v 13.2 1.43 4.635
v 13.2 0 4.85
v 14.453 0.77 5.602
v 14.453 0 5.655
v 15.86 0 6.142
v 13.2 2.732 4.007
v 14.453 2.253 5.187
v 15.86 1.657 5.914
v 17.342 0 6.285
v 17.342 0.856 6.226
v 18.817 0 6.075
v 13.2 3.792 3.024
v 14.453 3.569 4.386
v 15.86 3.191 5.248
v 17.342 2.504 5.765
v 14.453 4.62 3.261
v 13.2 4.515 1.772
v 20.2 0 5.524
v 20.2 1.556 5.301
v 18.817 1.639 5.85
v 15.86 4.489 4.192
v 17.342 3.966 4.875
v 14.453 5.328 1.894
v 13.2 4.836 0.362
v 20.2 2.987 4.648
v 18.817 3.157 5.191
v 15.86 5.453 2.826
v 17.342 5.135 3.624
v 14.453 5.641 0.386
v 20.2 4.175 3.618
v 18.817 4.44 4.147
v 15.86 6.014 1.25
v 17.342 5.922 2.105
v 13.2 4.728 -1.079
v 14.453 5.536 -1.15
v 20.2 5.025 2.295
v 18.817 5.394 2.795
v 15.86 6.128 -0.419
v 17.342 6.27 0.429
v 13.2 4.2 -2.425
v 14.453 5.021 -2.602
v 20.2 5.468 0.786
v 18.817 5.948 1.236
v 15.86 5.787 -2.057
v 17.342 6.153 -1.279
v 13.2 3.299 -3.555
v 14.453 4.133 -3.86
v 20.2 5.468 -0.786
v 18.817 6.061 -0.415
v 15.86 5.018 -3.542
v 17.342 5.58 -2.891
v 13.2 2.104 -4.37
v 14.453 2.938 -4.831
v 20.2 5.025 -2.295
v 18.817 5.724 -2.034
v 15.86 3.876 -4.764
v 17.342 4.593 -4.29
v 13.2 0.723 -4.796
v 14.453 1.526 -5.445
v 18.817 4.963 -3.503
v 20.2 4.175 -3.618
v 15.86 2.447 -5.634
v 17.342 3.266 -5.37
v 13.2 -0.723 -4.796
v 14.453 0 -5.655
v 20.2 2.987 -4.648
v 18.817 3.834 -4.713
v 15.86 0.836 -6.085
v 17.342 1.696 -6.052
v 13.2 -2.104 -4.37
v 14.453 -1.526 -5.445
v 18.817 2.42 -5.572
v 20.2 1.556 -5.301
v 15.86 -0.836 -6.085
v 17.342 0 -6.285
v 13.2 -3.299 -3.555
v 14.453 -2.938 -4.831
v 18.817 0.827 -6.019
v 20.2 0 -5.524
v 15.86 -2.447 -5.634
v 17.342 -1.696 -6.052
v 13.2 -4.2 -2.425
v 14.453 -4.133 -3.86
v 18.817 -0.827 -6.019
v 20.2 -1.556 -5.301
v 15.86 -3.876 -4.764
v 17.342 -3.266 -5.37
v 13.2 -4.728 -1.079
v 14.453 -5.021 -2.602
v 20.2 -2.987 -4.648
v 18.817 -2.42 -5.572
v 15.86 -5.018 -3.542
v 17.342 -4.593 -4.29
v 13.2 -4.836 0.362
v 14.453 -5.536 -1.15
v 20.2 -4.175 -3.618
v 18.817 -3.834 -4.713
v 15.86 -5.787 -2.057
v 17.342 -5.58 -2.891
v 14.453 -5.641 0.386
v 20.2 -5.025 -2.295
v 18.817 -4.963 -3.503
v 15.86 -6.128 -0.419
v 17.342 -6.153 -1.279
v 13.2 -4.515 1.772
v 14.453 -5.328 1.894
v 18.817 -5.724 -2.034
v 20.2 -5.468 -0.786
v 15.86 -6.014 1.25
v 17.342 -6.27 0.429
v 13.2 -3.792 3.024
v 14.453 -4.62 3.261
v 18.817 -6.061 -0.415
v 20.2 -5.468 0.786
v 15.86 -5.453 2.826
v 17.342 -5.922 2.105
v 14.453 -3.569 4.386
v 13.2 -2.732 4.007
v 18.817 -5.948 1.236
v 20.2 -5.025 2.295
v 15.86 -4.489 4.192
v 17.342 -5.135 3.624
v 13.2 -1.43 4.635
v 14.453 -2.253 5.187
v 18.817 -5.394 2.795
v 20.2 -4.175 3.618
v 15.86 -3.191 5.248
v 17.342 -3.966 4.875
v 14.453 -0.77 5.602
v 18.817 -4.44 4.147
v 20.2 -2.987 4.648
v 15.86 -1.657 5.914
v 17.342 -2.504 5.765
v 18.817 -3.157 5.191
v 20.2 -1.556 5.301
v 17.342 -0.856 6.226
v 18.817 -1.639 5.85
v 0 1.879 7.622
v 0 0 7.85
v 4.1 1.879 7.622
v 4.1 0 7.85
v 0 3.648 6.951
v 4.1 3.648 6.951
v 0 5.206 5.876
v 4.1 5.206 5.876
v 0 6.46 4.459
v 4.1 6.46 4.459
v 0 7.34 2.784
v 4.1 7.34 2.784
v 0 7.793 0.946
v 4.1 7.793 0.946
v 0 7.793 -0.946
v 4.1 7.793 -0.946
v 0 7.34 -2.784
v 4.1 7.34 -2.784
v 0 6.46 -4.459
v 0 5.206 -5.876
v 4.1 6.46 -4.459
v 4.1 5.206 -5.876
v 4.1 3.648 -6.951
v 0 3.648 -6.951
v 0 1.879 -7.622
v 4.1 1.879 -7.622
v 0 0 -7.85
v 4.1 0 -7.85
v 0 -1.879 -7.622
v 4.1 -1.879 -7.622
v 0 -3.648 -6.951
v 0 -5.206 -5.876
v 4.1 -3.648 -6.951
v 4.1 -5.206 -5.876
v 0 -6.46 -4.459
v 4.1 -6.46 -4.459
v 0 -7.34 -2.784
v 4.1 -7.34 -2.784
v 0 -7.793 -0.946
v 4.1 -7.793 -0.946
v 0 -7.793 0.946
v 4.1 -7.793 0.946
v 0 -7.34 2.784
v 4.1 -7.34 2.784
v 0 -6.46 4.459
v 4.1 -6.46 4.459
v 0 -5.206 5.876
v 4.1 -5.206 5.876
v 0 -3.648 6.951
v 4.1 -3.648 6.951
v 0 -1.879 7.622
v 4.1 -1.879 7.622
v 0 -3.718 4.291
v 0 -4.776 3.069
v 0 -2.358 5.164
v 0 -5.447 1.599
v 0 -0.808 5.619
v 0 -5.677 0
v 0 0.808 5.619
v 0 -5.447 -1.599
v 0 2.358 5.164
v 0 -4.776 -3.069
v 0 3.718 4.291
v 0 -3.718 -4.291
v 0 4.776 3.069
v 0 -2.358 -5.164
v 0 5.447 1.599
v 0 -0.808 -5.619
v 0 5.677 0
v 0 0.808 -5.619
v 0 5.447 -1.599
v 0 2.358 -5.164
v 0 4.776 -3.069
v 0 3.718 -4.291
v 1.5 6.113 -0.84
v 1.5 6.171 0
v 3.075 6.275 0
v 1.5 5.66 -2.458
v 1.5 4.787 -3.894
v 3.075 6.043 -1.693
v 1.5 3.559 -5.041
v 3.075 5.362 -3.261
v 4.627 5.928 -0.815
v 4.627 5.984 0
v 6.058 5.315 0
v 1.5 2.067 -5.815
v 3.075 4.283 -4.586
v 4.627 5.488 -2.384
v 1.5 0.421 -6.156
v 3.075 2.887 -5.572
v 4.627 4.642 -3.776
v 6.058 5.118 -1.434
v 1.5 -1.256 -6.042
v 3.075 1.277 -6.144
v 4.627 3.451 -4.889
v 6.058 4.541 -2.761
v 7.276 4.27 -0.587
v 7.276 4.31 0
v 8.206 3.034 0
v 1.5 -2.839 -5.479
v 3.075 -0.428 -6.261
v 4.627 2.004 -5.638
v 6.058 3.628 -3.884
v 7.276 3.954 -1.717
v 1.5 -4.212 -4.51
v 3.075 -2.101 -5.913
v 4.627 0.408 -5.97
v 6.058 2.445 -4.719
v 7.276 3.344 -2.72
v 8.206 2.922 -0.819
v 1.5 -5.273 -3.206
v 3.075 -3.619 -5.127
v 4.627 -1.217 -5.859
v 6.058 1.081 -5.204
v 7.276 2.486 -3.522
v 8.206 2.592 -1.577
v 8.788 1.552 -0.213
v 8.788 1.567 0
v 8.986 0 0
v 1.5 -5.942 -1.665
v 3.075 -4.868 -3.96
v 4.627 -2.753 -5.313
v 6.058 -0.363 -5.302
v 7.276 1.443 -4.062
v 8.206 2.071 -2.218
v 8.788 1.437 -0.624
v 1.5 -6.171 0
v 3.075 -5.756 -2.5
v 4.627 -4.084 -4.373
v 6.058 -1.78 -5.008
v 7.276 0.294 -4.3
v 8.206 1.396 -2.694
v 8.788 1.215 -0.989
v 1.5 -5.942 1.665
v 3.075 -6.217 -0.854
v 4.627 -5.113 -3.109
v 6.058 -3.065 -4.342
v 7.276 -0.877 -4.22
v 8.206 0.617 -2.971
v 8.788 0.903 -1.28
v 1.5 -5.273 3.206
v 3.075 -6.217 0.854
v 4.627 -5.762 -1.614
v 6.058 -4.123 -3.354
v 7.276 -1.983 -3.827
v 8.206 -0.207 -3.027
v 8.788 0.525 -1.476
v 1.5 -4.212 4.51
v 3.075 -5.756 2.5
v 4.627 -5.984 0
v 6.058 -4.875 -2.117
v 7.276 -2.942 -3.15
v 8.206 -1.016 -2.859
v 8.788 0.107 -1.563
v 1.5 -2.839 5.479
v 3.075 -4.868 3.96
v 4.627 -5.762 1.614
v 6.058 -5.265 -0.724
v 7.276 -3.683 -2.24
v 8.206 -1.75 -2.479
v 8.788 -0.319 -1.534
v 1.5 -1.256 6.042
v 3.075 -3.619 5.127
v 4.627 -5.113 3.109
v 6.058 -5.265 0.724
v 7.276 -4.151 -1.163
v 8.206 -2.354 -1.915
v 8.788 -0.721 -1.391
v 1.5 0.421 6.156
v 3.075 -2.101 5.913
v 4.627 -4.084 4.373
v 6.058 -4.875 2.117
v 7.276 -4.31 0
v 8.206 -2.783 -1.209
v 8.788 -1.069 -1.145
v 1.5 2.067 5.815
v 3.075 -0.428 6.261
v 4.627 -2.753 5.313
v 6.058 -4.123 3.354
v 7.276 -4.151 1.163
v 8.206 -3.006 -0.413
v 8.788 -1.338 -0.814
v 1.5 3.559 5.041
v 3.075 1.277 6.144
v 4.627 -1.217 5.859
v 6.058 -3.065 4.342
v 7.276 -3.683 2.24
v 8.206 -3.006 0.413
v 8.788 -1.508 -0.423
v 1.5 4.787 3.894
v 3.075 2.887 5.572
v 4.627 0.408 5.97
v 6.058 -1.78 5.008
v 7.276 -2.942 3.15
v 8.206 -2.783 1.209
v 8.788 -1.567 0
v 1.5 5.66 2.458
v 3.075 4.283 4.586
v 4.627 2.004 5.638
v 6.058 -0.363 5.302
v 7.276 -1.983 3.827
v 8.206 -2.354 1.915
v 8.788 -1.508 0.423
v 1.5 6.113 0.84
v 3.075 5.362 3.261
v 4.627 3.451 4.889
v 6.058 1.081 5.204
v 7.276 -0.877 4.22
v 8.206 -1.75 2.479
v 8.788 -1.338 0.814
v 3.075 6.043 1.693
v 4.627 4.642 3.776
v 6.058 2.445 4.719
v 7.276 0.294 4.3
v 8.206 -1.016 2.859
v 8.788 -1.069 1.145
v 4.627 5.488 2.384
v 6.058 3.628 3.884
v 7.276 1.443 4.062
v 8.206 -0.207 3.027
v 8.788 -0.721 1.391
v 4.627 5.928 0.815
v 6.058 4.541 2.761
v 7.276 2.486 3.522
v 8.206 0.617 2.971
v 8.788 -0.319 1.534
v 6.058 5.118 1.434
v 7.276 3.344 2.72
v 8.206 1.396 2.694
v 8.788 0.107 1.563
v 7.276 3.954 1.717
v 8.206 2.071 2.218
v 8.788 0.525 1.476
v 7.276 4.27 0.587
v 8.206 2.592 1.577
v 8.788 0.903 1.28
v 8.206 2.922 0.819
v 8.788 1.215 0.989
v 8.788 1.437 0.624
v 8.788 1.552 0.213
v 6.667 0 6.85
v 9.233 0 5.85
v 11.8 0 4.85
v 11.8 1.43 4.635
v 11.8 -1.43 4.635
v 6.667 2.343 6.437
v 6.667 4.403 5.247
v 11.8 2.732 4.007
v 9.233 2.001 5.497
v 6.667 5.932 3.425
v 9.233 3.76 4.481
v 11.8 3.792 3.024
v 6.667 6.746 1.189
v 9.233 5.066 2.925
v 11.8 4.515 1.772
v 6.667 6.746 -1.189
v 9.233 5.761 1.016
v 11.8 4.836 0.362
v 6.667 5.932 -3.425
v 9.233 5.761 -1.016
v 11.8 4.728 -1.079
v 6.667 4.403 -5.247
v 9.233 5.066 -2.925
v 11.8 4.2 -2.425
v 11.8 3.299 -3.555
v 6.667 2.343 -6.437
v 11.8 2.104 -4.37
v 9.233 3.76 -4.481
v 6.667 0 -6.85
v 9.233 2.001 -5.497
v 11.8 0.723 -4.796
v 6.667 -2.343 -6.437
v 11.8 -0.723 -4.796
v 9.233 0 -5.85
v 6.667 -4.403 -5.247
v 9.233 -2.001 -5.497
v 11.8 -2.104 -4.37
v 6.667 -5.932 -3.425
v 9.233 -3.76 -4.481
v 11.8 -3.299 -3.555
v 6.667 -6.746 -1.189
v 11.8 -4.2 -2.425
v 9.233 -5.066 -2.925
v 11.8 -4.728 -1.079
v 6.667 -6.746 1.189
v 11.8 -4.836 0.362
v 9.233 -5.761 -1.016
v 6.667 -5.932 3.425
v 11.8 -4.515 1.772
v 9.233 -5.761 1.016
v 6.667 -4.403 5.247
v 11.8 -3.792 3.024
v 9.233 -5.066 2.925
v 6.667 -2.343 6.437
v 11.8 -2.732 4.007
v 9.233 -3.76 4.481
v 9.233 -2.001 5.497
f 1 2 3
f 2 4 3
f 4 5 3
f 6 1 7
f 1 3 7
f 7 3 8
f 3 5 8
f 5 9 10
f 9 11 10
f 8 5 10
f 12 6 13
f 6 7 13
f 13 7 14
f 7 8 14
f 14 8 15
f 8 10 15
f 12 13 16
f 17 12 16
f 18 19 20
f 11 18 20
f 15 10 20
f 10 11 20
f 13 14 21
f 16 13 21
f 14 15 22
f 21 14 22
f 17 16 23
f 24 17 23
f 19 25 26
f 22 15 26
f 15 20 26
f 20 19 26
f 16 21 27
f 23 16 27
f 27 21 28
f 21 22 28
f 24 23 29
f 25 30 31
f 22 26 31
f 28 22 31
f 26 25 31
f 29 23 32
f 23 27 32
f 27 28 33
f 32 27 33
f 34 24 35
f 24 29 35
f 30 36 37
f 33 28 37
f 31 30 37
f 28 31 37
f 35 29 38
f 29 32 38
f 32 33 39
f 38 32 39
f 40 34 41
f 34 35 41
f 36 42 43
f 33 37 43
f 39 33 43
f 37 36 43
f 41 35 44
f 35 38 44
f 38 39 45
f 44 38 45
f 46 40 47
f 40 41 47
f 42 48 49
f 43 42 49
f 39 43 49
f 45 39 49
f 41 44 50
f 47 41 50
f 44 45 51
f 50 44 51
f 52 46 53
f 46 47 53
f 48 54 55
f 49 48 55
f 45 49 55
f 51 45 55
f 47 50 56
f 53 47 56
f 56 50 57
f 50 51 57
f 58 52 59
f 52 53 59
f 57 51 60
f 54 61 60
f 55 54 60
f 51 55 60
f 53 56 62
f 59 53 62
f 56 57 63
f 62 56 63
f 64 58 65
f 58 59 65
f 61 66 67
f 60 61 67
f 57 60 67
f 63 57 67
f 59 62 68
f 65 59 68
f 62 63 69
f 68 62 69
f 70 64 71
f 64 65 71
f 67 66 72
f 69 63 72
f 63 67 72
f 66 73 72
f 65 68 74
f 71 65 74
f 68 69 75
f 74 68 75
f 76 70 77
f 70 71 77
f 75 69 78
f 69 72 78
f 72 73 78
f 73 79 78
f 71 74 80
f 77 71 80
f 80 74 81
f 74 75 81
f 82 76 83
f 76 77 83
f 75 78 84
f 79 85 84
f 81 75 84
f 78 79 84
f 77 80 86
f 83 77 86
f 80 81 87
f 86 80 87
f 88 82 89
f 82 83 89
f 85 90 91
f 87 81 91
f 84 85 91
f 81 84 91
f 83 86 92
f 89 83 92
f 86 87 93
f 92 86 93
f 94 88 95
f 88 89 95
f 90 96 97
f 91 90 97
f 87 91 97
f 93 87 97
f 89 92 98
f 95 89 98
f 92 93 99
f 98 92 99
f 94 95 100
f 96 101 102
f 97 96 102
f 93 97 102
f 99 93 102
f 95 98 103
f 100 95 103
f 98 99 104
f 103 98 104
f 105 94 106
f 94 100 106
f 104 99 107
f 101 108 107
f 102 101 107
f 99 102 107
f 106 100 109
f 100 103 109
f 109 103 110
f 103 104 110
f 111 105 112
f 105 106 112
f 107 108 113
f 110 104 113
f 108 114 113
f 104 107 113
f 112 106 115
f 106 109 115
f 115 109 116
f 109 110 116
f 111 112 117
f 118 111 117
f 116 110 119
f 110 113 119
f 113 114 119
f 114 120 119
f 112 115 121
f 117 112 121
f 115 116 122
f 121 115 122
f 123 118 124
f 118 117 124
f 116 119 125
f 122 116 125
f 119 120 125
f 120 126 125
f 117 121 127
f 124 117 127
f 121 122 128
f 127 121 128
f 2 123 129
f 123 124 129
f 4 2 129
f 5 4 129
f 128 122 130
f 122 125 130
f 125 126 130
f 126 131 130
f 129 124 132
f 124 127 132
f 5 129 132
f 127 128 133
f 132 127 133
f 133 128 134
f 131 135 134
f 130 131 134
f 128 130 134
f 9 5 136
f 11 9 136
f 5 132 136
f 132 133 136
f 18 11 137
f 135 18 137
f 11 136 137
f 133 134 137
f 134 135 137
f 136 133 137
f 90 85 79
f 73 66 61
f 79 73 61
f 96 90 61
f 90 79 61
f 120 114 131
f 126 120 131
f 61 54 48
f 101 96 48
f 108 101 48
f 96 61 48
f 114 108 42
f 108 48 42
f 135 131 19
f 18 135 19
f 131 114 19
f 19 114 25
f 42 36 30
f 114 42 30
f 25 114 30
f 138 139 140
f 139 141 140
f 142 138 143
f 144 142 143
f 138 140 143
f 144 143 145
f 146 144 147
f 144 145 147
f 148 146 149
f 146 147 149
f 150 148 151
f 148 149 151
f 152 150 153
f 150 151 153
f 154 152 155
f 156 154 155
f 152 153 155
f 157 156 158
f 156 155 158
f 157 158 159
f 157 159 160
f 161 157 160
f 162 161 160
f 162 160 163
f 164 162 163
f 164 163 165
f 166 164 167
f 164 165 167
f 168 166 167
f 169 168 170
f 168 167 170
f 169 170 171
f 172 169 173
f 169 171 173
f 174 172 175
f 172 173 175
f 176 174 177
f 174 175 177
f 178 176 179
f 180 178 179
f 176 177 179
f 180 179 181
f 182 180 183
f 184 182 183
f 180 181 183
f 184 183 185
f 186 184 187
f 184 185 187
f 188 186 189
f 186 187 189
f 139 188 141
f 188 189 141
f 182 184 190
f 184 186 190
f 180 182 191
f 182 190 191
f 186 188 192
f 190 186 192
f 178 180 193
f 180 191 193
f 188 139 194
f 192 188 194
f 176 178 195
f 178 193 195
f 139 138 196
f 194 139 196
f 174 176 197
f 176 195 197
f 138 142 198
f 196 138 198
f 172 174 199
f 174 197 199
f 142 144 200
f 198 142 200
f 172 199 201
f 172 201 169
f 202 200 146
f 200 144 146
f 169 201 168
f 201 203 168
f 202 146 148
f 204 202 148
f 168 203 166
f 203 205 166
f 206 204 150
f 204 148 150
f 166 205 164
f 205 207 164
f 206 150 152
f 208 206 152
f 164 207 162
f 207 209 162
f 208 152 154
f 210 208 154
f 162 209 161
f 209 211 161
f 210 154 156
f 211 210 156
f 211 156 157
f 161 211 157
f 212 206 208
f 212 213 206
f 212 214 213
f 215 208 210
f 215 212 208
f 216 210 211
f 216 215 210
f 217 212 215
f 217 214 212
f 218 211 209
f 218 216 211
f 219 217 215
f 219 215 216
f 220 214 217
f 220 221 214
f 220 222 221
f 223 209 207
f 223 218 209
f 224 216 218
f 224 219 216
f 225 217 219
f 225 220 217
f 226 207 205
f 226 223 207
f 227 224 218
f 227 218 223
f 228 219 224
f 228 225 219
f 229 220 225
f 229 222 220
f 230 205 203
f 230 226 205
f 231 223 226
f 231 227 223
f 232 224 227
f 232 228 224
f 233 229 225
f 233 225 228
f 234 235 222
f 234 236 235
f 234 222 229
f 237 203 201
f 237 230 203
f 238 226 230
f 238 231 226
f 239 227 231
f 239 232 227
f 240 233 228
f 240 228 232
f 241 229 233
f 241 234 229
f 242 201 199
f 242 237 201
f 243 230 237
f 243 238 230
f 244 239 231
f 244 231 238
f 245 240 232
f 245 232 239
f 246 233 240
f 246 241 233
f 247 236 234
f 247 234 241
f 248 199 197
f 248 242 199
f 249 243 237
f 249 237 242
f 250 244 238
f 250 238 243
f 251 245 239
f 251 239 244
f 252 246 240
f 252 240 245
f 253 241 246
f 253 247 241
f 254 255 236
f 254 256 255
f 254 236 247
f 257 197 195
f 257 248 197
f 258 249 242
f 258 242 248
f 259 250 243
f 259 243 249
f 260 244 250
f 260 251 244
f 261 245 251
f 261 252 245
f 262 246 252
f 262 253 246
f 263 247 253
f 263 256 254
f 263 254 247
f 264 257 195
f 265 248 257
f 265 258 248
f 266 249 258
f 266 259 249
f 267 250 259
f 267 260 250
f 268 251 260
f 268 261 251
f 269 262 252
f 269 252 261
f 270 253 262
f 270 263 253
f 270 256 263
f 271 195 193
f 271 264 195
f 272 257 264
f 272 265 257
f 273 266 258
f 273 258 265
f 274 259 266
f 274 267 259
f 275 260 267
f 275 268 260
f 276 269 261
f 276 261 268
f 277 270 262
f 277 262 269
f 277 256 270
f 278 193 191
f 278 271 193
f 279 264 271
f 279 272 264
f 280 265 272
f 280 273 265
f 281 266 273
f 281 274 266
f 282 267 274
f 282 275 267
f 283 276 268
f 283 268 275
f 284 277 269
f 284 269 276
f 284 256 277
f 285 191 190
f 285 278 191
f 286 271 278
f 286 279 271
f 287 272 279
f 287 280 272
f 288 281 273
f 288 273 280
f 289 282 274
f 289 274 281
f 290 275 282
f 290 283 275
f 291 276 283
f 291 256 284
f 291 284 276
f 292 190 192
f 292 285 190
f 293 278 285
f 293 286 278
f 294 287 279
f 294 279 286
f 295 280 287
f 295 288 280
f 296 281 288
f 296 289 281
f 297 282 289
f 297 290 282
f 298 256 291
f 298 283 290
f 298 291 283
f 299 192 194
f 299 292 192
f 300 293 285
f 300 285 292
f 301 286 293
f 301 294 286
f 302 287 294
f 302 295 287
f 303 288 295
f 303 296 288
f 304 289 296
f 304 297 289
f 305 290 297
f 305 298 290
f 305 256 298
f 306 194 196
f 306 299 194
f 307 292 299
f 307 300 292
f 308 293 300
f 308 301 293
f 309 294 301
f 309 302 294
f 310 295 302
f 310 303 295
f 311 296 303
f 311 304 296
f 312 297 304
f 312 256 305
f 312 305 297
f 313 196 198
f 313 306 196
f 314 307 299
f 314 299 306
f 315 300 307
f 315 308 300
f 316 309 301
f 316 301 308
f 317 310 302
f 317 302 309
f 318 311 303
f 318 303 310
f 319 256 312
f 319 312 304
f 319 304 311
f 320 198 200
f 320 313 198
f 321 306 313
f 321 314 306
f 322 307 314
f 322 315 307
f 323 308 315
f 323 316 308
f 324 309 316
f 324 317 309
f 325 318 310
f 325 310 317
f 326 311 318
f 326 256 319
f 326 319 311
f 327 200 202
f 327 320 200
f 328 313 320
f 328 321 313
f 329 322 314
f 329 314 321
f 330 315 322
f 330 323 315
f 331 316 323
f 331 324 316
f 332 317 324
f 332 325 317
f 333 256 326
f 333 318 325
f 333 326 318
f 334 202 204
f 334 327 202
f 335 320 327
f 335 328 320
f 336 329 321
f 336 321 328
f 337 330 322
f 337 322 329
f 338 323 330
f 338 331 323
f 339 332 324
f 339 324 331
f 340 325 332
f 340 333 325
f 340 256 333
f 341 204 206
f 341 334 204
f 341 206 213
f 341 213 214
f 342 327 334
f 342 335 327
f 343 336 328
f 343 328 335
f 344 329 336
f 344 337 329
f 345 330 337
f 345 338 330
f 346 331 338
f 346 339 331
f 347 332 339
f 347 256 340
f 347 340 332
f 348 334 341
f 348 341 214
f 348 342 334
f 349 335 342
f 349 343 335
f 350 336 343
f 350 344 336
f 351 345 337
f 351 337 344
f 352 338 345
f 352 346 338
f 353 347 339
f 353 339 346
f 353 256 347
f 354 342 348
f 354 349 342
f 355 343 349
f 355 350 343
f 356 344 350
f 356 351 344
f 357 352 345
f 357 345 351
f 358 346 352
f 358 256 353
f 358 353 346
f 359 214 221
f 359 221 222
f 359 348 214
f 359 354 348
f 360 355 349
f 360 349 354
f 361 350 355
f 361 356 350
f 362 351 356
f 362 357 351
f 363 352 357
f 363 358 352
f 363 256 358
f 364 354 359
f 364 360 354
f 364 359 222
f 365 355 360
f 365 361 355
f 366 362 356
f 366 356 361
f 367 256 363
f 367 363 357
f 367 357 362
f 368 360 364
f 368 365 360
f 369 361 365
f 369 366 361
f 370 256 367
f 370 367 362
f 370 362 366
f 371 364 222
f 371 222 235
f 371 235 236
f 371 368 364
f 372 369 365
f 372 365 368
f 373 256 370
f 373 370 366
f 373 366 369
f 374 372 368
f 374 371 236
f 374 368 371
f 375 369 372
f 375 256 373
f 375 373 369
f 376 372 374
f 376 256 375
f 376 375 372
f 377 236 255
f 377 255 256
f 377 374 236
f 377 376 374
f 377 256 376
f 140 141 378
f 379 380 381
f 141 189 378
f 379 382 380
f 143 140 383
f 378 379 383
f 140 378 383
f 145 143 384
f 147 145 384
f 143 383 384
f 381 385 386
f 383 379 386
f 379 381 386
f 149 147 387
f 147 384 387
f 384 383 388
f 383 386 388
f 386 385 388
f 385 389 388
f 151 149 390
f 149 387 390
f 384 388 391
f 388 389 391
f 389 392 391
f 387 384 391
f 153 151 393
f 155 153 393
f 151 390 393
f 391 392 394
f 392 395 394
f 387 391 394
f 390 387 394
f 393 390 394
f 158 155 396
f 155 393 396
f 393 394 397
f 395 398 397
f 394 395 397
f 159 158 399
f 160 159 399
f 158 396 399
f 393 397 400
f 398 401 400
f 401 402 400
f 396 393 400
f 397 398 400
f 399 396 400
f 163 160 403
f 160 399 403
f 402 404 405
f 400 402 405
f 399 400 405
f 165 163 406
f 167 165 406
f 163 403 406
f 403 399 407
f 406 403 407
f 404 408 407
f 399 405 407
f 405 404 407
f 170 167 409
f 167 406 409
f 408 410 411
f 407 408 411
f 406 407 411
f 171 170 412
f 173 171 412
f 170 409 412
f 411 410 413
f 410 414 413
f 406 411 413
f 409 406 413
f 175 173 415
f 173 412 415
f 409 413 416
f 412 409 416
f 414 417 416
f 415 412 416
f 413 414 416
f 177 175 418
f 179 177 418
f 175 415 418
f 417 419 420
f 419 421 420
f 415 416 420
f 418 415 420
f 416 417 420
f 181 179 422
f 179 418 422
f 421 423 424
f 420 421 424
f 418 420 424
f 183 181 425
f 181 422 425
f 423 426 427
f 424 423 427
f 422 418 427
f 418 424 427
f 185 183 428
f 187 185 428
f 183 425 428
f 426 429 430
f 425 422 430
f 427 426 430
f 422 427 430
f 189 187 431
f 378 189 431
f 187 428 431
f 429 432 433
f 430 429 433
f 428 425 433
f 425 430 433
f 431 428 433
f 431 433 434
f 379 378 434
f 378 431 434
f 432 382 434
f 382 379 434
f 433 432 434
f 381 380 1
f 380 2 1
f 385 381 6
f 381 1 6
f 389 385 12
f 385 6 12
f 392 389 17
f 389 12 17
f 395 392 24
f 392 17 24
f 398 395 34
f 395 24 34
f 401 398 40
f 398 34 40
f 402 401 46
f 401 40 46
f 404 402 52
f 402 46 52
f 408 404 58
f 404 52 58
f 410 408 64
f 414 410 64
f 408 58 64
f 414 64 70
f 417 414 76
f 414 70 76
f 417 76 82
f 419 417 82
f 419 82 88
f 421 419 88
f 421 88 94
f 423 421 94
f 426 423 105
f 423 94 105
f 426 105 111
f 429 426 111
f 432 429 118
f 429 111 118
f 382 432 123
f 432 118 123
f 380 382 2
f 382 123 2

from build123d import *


with BuildPart() as part:
    # 草图1 → 旋转1 (revolve)
    with BuildSketch(Plane.XY):
        with BuildLine():
            Line((0, 0), (0, 7.85))
            Line((0, 7.85), (4.1, 7.85))
            Line((4.1, 7.85), (11.8, 4.85))
            Line((11.8, 4.85), (13.20030223, 4.85))
            ThreePointArc((13.20030223, 4.85), (16.597019137, 6.257515188), (20.2, 5.524498371))
            Line((20.2, 5.524498371), (20.2, 0))
            Line((20.2, 0), (0, 0))
        make_face()
    revolve(axis=Axis((20.2, 0, 0), (-1, 0, 0)))

    # 草图2 → 切除-旋转1 (revolve, cut)
    with BuildSketch(Plane.XY):
        with BuildLine():
            Line((8.9865, 0), (-3.5865, 0))
            ThreePointArc((-3.5865, 0), (2.7, 6.2865), (8.9865, 0))
        make_face()
    revolve(axis=Axis((50, 0, 0), (-1, 0, 0)), mode=Mode.SUBTRACT)


solid = part.part
